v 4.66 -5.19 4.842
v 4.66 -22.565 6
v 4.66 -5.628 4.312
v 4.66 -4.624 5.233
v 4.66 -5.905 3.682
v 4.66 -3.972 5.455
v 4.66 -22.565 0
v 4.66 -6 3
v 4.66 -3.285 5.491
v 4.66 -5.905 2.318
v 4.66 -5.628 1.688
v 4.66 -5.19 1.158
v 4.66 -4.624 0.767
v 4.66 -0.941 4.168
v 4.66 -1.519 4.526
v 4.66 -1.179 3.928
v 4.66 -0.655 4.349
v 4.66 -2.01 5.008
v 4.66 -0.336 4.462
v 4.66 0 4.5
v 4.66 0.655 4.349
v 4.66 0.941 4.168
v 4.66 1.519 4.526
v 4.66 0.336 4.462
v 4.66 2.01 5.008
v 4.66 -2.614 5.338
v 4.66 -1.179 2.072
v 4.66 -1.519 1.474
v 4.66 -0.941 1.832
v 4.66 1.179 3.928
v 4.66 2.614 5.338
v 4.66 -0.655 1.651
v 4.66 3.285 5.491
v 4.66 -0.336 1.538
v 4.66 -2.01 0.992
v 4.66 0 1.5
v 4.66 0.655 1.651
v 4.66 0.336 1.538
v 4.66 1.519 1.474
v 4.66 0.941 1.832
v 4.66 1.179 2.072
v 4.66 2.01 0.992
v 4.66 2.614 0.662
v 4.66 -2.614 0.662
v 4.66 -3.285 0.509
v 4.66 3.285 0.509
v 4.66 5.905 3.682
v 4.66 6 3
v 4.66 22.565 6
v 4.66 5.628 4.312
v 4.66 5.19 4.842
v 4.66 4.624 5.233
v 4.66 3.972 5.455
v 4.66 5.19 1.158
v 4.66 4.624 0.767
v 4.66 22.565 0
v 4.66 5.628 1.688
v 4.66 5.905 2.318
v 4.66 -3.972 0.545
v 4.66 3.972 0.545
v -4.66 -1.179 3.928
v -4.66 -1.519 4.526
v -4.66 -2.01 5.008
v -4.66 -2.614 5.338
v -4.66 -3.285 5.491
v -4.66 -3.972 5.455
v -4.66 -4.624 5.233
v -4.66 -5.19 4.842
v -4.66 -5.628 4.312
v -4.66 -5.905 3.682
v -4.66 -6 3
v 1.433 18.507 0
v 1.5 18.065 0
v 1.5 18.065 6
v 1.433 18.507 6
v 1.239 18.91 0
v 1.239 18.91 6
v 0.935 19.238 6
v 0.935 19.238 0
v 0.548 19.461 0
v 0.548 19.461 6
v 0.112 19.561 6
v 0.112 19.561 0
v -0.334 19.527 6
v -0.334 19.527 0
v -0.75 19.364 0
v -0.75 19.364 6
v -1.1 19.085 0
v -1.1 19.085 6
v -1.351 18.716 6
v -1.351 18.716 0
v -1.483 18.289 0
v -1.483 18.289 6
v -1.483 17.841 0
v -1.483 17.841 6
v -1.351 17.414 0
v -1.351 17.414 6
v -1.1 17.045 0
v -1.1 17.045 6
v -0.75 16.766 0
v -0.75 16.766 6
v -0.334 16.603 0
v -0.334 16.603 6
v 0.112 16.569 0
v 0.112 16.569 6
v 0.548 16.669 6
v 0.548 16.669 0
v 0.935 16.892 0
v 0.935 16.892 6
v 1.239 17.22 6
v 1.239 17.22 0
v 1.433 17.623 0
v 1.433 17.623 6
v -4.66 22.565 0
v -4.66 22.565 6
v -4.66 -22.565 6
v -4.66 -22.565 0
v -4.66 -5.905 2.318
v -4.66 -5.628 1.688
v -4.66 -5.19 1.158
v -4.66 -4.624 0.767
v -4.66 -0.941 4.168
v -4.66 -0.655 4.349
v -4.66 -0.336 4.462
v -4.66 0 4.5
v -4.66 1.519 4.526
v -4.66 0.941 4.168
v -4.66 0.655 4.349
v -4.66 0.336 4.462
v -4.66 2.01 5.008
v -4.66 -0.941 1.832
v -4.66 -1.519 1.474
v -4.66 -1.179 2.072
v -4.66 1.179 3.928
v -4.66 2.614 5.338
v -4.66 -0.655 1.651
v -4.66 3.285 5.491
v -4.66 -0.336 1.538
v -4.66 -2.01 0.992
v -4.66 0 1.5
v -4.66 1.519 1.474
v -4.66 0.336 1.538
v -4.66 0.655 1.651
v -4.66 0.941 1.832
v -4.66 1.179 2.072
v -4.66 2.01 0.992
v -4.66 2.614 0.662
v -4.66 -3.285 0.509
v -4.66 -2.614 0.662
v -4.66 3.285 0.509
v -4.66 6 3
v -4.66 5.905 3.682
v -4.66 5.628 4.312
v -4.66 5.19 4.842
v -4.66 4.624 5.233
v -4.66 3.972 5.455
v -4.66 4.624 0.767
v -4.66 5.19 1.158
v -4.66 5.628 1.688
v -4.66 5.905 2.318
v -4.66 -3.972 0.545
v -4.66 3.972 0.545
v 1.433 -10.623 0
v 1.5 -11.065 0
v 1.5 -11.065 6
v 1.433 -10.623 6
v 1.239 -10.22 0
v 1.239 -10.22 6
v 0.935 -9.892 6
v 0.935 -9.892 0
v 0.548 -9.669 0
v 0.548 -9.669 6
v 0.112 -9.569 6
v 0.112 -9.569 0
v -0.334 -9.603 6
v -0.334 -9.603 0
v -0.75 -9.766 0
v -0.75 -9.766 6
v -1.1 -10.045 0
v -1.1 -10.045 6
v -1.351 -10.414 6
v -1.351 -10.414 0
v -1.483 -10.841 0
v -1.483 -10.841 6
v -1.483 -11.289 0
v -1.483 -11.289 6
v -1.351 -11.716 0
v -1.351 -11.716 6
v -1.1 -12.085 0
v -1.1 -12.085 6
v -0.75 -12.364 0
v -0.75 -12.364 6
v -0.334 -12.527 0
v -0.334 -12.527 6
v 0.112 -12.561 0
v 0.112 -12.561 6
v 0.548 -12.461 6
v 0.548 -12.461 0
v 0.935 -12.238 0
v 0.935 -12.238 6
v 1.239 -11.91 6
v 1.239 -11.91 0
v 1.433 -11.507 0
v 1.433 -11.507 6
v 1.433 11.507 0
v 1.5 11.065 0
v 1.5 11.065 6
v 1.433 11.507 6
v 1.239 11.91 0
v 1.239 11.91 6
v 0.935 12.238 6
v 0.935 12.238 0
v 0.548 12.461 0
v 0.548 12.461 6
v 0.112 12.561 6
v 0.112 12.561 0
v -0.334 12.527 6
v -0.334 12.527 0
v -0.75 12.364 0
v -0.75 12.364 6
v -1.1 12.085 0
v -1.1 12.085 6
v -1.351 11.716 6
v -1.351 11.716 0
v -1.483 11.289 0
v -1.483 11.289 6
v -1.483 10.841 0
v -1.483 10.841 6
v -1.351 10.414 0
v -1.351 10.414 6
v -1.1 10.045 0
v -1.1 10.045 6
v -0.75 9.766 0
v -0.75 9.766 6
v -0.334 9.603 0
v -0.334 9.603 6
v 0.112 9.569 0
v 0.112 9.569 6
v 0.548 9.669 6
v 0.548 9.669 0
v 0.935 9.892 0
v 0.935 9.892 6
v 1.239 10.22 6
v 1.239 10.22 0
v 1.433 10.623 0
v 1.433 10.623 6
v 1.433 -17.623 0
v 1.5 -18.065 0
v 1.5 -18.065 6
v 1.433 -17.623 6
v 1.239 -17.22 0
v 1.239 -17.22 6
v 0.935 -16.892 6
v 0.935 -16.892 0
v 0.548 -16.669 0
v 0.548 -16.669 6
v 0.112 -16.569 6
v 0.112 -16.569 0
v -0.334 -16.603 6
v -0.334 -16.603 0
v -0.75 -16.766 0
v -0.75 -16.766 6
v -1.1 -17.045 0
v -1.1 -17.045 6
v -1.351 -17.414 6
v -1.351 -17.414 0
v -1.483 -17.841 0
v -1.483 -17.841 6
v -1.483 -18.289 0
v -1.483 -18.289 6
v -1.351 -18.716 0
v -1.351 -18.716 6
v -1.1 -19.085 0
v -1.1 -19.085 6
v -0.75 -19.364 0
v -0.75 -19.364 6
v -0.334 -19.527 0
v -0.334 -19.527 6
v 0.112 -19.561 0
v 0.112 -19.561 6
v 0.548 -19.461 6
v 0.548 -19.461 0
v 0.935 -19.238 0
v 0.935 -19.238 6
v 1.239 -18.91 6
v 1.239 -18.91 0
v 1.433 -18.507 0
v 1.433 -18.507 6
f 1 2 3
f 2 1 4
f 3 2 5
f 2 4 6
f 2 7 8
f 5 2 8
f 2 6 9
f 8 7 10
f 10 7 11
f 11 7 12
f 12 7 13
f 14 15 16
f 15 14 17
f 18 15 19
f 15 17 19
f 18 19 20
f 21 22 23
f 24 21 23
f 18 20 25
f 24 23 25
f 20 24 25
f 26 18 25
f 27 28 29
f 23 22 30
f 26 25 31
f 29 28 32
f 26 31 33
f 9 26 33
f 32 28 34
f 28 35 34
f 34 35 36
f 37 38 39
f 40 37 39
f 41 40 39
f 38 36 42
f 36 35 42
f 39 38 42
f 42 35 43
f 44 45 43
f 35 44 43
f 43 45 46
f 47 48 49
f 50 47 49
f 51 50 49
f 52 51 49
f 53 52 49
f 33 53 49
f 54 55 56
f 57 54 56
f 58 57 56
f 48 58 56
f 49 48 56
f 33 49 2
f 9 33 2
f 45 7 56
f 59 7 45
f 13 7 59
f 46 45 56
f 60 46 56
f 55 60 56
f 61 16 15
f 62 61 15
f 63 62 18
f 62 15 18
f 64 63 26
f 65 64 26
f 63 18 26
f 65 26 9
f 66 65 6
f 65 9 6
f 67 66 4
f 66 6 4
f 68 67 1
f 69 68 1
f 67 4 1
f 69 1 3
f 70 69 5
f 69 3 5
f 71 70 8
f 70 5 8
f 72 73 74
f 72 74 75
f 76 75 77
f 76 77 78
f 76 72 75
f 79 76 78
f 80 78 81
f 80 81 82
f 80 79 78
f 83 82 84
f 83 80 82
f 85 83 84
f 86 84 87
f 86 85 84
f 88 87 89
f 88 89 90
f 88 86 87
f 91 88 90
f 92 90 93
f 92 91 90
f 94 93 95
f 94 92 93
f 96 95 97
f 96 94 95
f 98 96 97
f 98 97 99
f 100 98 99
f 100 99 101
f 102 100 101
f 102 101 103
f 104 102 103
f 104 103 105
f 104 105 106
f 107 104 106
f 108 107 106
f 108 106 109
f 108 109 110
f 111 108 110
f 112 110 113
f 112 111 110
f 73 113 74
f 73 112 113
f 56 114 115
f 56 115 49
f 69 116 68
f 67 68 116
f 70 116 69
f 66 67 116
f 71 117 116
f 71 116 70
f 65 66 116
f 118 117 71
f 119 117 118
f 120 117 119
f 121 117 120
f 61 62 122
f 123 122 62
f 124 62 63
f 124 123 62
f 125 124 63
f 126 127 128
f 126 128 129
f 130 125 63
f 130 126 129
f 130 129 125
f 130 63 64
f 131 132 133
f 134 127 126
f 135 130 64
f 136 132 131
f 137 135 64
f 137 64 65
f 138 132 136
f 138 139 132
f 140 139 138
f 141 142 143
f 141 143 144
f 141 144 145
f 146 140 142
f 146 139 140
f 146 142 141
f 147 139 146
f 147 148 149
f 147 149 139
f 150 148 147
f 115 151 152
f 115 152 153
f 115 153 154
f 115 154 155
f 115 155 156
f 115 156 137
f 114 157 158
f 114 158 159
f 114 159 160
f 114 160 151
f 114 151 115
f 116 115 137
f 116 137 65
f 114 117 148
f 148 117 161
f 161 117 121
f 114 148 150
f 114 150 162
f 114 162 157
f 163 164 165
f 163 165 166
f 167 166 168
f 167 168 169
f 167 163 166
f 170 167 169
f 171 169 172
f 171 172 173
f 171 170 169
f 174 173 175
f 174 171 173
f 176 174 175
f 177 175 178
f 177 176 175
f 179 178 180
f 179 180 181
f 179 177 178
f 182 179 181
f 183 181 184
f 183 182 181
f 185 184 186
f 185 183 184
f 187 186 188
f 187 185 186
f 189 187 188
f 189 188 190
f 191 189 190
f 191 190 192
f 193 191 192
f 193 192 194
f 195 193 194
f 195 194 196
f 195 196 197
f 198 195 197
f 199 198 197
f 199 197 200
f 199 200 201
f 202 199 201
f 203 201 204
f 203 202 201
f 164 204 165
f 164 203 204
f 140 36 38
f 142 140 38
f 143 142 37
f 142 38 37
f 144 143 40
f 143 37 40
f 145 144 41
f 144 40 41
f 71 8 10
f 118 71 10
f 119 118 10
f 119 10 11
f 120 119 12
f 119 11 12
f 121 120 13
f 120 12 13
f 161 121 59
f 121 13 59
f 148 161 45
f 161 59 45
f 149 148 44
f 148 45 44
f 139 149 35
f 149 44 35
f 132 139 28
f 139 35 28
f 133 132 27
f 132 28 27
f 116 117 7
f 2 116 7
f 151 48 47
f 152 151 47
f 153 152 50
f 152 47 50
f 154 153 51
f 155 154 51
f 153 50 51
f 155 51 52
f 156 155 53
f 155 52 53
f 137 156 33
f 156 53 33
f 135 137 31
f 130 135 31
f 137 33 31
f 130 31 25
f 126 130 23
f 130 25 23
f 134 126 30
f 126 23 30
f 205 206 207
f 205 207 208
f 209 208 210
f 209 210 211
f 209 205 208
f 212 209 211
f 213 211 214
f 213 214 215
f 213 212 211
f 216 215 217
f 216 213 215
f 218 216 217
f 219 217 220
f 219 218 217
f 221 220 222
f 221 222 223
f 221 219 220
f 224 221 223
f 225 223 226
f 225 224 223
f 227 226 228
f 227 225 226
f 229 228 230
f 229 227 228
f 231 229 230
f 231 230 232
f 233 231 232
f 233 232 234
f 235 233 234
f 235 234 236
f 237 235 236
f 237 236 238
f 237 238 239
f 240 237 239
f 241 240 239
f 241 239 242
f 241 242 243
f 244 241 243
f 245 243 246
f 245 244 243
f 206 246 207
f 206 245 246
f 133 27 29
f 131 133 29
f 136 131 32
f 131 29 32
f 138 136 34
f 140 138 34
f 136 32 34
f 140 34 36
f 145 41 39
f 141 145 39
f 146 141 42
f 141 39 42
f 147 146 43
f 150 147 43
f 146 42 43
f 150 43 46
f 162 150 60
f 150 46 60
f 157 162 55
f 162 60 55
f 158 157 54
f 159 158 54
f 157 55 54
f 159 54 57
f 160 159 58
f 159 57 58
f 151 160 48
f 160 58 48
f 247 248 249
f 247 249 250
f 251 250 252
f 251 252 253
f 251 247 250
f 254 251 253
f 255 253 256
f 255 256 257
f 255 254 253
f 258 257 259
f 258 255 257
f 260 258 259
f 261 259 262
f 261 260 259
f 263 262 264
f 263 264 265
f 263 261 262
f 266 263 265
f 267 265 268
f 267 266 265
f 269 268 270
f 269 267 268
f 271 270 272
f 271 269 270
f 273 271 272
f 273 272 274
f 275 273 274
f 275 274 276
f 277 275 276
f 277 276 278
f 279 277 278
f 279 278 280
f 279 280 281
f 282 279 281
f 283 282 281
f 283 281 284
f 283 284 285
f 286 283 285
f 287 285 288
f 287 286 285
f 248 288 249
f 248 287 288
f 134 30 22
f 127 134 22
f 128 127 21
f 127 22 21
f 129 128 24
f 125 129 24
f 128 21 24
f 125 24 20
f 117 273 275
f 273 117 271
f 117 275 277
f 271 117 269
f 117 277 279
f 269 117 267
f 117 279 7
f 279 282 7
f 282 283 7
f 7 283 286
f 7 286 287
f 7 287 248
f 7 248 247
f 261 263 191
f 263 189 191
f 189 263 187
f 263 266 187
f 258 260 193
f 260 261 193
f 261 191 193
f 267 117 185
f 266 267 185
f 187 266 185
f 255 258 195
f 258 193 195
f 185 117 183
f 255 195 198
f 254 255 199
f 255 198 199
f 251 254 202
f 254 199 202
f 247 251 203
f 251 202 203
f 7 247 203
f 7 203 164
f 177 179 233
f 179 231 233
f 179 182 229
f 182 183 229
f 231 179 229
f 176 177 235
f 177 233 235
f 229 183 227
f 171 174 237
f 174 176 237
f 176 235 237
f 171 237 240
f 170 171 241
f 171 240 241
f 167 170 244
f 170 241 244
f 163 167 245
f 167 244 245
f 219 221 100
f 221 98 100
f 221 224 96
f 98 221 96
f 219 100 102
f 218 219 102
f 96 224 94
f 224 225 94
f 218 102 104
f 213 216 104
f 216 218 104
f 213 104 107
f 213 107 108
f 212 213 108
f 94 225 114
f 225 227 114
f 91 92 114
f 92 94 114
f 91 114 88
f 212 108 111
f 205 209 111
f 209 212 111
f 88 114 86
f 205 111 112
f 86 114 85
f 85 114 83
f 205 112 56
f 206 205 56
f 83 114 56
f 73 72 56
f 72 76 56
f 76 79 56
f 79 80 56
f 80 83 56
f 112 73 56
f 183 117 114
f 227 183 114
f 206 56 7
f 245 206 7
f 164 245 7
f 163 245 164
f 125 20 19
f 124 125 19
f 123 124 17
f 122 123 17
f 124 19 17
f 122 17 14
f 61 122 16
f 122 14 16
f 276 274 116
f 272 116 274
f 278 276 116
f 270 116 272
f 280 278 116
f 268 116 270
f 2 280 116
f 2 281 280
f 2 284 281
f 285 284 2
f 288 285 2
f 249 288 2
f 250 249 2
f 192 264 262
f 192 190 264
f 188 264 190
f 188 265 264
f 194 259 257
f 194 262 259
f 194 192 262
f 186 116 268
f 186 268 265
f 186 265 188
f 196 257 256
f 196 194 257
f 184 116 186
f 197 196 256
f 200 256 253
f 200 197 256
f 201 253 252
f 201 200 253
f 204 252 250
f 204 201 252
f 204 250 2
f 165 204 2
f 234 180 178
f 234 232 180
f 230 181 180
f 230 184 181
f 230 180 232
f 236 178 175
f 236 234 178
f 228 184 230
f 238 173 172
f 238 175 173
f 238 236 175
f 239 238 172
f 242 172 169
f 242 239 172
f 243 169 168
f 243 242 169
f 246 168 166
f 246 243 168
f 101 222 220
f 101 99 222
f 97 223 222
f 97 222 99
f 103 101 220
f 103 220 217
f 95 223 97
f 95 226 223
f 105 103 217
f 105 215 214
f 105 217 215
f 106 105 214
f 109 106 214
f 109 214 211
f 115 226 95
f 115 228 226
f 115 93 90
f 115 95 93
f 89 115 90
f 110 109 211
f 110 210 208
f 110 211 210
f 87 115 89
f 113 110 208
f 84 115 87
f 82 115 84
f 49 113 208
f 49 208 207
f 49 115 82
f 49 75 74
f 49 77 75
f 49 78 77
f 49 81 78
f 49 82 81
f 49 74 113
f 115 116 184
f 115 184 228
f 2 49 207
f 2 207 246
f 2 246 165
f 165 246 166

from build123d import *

# Parameters (mm, degrees)
F0_W     = 9.32
F0_H     = 45.13
F0_R     = 1.5
F1_DEPTH = 6
F3_DEPTH = 9.32


with BuildPart() as f1:
    # F0 (on Top) → F1 (new body)
    with BuildSketch(Plane.XY):
        Rectangle(F0_W, F0_H)
        with Locations((0, -18.065)):
            Circle(F0_R, mode=Mode.SUBTRACT)
        with Locations((0, -11.065)):
            Circle(F0_R, mode=Mode.SUBTRACT)
        with Locations((0, 11.065)):
            Circle(F0_R, mode=Mode.SUBTRACT)
        with Locations((0, 18.065)):
            Circle(F0_R, mode=Mode.SUBTRACT)
    extrude(amount=F1_DEPTH)

    # F2 (on face) → F3 (cut, through all)
    with BuildSketch(Plane.YZ.offset(4.66)):
        with BuildLine():
            ThreePointArc((1.1785714286, 3.9278843612), (1.4173667738, 3.490990253), (1.5, 3))
            Line((1.5, 3), (6, 3))
            ThreePointArc((6, 3), (3.9724555913, 5.4549512652), (1.1785714286, 3.9278843612))
        make_face()
        with BuildLine():
            ThreePointArc((1.5, 3), (1.4173667738, 2.509009747), (1.1785714286, 2.0721156388))
            ThreePointArc((1.1785714286, 2.0721156388), (3.9724555913, 0.5450487348), (6, 3))
            Line((6, 3), (1.5, 3))
        make_face()
        with BuildLine():
            Line((-6, 3), (-1.5, 3))
            ThreePointArc((-1.5, 3), (-1.4173667738, 3.490990253), (-1.1785714286, 3.9278843612))
            ThreePointArc((-1.1785714286, 3.9278843612), (-3.9724555913, 5.4549512652), (-6, 3))
        make_face()
        with BuildLine():
            ThreePointArc((-6, 3), (-3.9724555913, 0.5450487348), (-1.1785714286, 2.0721156388))
            ThreePointArc((-1.1785714286, 2.0721156388), (-1.4173667738, 2.509009747), (-1.5, 3))
            Line((-1.5, 3), (-6, 3))
        make_face()
        with BuildLine():
            Line((-1.5, 3), (-1, 3))
            ThreePointArc((-1, 3), (-1.0450487348, 3.4724555913), (-1.1785714286, 3.9278843612))
            ThreePointArc((-1.1785714286, 3.9278843612), (-1.4173667738, 3.490990253), (-1.5, 3))
        make_face()
        with BuildLine():
            ThreePointArc((-1.5, 3), (-1.4173667738, 2.509009747), (-1.1785714286, 2.0721156388))
            ThreePointArc((-1.1785714286, 2.0721156388), (-1.0450487348, 2.5275444087), (-1, 3))
            Line((-1, 3), (-1.5, 3))
        make_face()
        with BuildLine():
            Line((-1, 3), (0, 3))
            Line((0, 3), (0, 4.5))
            ThreePointArc((0, 4.5), (-0.6550471198, 4.3494121946), (-1.1785714286, 3.9278843612))
            ThreePointArc((-1.1785714286, 3.9278843612), (-1.0450487348, 3.4724555913), (-1, 3))
        make_face()
        with BuildLine():
            Line((0, 4.5), (0, 3))
            Line((0, 3), (1, 3))
            ThreePointArc((1, 3), (1.0450487348, 3.4724555913), (1.1785714286, 3.9278843612))
            ThreePointArc((1.1785714286, 3.9278843612), (0.6550471198, 4.3494121946), (0, 4.5))
        make_face()
        with BuildLine():
            ThreePointArc((1.1785714286, 3.9278843612), (1.0450487348, 3.4724555913), (1, 3))
            Line((1, 3), (1.5, 3))
            ThreePointArc((1.5, 3), (1.4173667738, 3.490990253), (1.1785714286, 3.9278843612))
        make_face()
        with BuildLine():
            ThreePointArc((1, 3), (1.0450487348, 2.5275444087), (1.1785714286, 2.0721156388))
            ThreePointArc((1.1785714286, 2.0721156388), (1.4173667738, 2.509009747), (1.5, 3))
            Line((1.5, 3), (1, 3))
        make_face()
        with BuildLine():
            Line((0, 3), (0, 1.5))
            ThreePointArc((0, 1.5), (0.6550471198, 1.6505878054), (1.1785714286, 2.0721156388))
            ThreePointArc((1.1785714286, 2.0721156388), (1.0450487348, 2.5275444087), (1, 3))
            Line((1, 3), (0, 3))
        make_face()
        with BuildLine():
            ThreePointArc((-1.1785714286, 2.0721156388), (-0.6550471198, 1.6505878054), (0, 1.5))
            Line((0, 1.5), (0, 3))
            Line((0, 3), (-1, 3))
            ThreePointArc((-1, 3), (-1.0450487348, 2.5275444087), (-1.1785714286, 2.0721156388))
        make_face()
    extrude(amount=-F3_DEPTH, mode=Mode.SUBTRACT)


solid = f1.part
